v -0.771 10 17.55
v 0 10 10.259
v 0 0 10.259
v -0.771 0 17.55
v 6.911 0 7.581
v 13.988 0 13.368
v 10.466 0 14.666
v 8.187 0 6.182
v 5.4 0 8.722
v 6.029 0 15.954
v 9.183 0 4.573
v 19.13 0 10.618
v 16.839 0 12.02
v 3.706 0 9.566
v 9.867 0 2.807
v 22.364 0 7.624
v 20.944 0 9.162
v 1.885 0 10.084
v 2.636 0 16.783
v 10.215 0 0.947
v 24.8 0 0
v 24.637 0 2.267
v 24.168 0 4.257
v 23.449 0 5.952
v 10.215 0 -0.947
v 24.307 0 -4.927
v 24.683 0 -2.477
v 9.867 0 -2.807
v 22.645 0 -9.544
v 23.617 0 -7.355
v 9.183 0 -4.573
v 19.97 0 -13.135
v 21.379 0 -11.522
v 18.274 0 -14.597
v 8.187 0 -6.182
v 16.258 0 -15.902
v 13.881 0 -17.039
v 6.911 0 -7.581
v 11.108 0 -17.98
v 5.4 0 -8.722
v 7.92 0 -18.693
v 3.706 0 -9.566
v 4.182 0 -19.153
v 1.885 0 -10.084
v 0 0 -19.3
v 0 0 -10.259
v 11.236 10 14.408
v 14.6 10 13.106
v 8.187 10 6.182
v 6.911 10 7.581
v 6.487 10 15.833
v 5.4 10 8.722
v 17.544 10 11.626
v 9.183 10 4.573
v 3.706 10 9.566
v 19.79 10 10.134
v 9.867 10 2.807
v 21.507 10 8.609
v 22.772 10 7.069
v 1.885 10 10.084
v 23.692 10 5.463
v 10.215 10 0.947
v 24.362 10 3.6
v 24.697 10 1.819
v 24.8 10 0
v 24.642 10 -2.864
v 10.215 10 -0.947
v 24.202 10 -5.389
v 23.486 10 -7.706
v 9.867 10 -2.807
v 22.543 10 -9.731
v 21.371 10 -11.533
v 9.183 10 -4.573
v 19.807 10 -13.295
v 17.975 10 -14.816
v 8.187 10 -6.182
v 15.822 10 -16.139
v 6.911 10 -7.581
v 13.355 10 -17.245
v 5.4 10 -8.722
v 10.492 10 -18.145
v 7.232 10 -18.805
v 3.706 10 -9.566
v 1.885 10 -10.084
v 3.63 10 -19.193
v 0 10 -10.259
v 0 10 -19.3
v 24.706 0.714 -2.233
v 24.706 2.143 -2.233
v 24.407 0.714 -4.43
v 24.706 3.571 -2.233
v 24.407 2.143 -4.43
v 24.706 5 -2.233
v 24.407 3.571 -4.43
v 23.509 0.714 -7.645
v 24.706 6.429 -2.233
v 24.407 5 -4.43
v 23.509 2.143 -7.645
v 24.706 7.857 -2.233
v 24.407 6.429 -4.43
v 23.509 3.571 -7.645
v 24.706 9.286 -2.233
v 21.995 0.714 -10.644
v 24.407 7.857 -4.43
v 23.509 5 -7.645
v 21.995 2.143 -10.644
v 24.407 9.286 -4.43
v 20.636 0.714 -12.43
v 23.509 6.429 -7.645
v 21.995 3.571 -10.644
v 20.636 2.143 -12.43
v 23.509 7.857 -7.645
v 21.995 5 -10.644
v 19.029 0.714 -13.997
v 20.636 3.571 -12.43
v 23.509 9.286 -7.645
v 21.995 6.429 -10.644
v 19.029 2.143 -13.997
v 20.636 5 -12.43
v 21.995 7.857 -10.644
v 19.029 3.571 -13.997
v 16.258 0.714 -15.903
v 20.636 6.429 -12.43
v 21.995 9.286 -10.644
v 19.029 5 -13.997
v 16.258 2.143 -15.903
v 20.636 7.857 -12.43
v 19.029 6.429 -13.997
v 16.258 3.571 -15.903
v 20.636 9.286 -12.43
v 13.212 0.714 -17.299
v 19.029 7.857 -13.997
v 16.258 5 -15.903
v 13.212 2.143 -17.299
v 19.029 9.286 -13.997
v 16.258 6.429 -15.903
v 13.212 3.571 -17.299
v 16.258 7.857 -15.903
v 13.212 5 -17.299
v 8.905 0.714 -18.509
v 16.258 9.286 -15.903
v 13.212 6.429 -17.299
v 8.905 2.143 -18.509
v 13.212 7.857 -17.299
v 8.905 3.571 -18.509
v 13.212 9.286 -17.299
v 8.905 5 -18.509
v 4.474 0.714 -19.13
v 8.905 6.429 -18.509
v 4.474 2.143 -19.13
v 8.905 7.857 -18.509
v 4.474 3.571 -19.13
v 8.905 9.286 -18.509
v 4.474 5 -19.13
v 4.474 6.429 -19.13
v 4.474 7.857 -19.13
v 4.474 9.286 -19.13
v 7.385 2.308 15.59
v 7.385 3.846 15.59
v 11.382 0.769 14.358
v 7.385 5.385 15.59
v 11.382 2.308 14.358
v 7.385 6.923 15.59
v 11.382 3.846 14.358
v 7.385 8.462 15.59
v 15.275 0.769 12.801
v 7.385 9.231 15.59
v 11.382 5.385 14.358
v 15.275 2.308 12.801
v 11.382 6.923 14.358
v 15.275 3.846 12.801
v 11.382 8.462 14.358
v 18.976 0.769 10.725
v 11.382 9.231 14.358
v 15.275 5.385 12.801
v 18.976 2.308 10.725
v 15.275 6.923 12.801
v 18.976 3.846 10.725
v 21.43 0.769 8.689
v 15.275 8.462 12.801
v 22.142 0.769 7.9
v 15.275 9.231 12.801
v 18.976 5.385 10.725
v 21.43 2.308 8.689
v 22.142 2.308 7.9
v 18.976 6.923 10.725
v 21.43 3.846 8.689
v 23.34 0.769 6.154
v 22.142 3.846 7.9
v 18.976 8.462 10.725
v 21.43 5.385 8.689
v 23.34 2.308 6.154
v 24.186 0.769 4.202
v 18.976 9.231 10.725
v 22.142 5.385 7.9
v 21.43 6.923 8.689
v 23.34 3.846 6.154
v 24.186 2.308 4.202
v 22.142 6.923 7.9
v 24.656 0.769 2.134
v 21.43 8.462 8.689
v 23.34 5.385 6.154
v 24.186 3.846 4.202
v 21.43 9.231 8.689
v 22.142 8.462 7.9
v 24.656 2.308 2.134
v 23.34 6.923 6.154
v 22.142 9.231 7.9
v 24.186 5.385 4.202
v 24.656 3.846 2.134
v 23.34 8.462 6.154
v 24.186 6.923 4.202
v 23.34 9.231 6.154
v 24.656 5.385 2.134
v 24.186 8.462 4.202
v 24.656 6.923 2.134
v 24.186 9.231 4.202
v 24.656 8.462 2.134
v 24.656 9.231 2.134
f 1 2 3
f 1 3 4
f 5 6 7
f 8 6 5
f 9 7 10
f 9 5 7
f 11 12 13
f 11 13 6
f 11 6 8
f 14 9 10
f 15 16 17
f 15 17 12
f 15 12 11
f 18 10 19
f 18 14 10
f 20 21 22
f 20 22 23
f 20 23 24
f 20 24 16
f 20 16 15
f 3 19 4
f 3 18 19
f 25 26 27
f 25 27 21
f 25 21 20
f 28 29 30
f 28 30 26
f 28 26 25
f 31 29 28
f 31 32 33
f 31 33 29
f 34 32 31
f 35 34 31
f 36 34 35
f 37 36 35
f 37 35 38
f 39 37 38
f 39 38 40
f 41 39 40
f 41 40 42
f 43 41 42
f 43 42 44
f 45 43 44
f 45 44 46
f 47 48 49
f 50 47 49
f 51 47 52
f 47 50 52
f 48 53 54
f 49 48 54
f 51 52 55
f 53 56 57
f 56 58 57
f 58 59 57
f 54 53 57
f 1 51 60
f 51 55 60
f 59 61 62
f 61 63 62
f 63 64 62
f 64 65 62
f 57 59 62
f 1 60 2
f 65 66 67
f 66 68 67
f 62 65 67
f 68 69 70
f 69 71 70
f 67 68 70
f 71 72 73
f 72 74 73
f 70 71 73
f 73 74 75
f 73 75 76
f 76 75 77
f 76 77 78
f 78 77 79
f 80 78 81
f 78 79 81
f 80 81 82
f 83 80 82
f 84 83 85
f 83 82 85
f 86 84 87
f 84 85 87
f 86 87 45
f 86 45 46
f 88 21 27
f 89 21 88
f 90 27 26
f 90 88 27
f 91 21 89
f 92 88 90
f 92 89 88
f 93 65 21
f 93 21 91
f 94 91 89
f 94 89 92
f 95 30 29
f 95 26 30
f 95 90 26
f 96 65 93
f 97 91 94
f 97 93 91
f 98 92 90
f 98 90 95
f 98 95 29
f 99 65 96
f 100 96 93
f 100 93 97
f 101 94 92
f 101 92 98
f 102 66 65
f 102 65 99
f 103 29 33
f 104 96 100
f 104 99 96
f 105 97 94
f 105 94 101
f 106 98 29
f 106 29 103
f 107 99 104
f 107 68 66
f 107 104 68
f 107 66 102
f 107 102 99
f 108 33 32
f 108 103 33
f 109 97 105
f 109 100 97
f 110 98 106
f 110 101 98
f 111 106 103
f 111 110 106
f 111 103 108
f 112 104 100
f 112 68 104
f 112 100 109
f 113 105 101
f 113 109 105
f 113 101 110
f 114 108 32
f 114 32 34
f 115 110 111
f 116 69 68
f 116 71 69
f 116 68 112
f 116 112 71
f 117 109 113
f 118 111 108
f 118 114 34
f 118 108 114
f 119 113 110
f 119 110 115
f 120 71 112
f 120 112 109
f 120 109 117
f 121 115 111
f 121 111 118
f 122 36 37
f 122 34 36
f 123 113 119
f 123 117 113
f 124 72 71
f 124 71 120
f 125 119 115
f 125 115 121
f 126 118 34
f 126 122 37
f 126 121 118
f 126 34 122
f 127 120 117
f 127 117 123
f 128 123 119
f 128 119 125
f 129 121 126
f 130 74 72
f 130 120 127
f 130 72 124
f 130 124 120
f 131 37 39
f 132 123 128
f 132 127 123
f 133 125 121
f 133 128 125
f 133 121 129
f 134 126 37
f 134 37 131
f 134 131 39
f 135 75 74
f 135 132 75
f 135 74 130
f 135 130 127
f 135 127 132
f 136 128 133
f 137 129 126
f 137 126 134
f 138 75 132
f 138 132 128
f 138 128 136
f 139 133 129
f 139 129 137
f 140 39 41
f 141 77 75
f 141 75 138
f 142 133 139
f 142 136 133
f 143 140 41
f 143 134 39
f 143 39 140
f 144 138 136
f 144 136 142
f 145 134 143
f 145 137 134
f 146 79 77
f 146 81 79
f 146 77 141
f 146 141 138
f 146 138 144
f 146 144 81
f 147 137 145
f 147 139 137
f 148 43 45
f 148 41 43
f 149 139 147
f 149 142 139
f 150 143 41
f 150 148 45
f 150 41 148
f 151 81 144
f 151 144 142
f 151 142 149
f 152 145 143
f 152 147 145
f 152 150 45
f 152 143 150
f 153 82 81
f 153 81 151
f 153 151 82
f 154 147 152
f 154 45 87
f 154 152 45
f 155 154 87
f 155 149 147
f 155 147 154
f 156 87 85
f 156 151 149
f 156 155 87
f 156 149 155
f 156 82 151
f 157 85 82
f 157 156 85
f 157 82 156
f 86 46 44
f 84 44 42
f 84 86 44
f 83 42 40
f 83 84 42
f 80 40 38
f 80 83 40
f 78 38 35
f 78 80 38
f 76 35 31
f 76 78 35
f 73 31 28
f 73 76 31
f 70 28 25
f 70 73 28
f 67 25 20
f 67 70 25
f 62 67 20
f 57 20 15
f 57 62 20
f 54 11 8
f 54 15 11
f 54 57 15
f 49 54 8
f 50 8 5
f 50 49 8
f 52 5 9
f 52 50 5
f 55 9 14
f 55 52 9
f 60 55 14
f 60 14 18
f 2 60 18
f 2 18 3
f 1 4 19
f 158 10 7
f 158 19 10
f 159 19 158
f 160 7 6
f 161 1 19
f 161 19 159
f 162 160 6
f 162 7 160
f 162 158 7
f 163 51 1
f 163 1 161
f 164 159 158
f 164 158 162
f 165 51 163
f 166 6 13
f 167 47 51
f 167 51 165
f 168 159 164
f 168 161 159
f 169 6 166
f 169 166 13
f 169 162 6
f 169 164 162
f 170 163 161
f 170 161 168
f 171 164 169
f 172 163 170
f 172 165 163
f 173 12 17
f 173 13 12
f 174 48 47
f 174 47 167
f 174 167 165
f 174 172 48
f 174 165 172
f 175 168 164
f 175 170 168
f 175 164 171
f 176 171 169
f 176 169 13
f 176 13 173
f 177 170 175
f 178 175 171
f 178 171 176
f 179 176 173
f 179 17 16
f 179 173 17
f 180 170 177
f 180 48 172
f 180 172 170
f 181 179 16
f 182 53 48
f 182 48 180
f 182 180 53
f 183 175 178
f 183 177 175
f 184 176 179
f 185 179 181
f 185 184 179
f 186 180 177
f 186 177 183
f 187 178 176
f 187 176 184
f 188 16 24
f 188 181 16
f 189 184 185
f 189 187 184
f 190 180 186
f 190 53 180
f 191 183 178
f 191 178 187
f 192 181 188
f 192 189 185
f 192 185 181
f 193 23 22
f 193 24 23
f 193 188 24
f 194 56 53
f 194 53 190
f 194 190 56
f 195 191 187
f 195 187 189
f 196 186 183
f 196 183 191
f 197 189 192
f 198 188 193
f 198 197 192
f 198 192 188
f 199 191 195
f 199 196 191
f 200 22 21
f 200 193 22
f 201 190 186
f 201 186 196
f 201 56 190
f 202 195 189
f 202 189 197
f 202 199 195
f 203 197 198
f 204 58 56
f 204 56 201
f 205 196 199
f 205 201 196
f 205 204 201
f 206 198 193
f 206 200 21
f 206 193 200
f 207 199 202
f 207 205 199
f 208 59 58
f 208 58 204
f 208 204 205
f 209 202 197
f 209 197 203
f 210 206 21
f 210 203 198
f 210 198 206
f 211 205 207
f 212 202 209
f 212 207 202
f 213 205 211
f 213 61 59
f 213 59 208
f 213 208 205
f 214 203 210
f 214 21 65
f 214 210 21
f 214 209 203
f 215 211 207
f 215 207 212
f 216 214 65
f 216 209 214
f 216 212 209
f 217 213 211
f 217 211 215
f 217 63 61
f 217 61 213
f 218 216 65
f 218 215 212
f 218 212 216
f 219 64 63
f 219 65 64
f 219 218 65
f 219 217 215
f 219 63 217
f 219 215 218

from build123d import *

# Parameters (mm, degrees)
BOSS_EXTRUDE1_DEPTH = 10
SKETCH5_W           = 190.665965361
SKETCH5_H           = 98.914857752
CUT_EXTRUDE2_DEPTH  = 131.512395512
SKETCH3_W           = 191.984120241
SKETCH3_H           = 92.475390347
CUT_EXTRUDE1_DEPTH  = 125.356356188


with BuildPart() as part:
    # Sketch2 → Boss-Extrude1 (new body)
    with BuildSketch(Plane(origin=(0, 0, 0), x_dir=(1, 0, 0), z_dir=(0, 1, 0))):
        with BuildLine():
            Line((-26, 24.3), (0, 24.3))
            add(Edge.make_bspline(
                [(0, 24.3), (20.683832289, 24.384713811), (29.8, 14.098961604), (29.8, 0)],
                knots=[0, 0, 0, 0, 1, 1, 1, 1], degree=3))
            add(Edge.make_bspline(
                [(29.8, 0), (29.8, -15.903385672), (12.793782652, -19.673675204), (0, -22.5)],
                knots=[0, 0, 0, 0, 1, 1, 1, 1], degree=3))
            add(Edge.make_bspline(
                [(-86.5, -27.9), (-58.742591927, -27.9), (0, -22.5)],
                knots=[0, 0, 0, 1, 1, 1], degree=2))
            add(Edge.make_bspline(
                [(-124.6, 11.6), (-126.645501882, -15.929564791), (-96.169164371, -28.458925346), (-86.5, -27.9)],
                knots=[0, 0, 0, 0, 1, 1, 1, 1], degree=3))
            add(Edge.make_bspline(
                [(-86.5, 37.2), (-111.583343569, 37.2), (-124.6, 21.145918181), (-124.6, 11.6)],
                knots=[0, 0, 0, 0, 1, 1, 1, 1], degree=3))
            add(Edge.make_bspline(
                [(-26, 24.3), (-46.37360759, 24.3), (-60.223367409, 37.2), (-86.5, 37.2)],
                knots=[0, 0, 0, 0, 1, 1, 1, 1], degree=3))
        make_face()
    extrude(amount=BOSS_EXTRUDE1_DEPTH)

    # Sketch5 → Cut-Extrude2 (cut, through all)
    with BuildSketch(Plane(origin=(0, 10, 0), x_dir=(1, 0, 0), z_dir=(0, 1, 0))):
        with Locations((-37.807166851, 5.712427693)):
            Rectangle(SKETCH5_W, SKETCH5_H)
        with BuildLine():
            Line((0, 19.3), (-26, 19.3))
            add(Edge.make_bspline(
                [(-26, 19.3), (-28.614389566, 19.3), (-31.195480065, 19.494126305), (-36.299918034, 20.219008193), (-38.823236595, 20.749932309), (-43.82844627, 22.053293526), (-46.31311575, 22.826190042), (-51.244397222, 24.470393512), (-53.69402913, 25.341112046), (-58.607069123, 27.040712597), (-61.070722849, 27.868848632), (-64.806301572, 28.989279687), (-66.059451522, 29.343006622), (-68.572193461, 29.996166113), (-69.832412317, 30.295833479), (-73.626302931, 31.102275727), (-76.173387066, 31.51524352), (-81.307214737, 32.063798503), (-83.893870441, 32.2), (-86.5, 32.2)],
                knots=[0, 0, 0, 0, 0.125, 0.125, 0.25, 0.25, 0.375, 0.375, 0.5, 0.5, 0.625, 0.625, 0.6875, 0.6875, 0.75, 0.75, 0.875, 0.875, 1, 1, 1, 1], degree=3))
            add(Edge.make_bspline(
                [(-86.5, 32.2), (-90.047671723, 32.2), (-93.539315109, 31.853363621), (-97.818101716, 30.88944061), (-98.669522164, 30.669824618), (-100.363040922, 30.17291839), (-101.207876089, 29.89460231), (-103.707194596, 28.9730152), (-105.314538731, 28.24898707), (-108.402461221, 26.564840966), (-109.885156962, 25.604040465), (-112.695415045, 23.412360835), (-113.989352092, 22.209304545), (-115.736354807, 20.217749989), (-116.286105675, 19.522480074), (-117.307591473, 18.056713662), (-117.771937921, 17.297113036), (-118.380597746, 16.112260348), (-118.568848857, 15.709499136), (-118.910400222, 14.885324985), (-119.063856456, 14.46298862), (-119.32099023, 13.612441675), (-119.425833719, 13.182501201), (-119.534502641, 12.528030347), (-119.56255262, 12.308265558), (-119.588853411, 11.975515189), (-119.594973106, 11.86407762), (-119.600932982, 11.639967141), (-119.6, 11.527142129), (-119.6, 11.414500659)],
                knots=[0, 0, 0, 0, 0.25, 0.25, 0.3125, 0.3125, 0.375, 0.375, 0.5, 0.5, 0.625, 0.625, 0.75, 0.75, 0.8125, 0.8125, 0.875, 0.875, 0.90625, 0.90625, 0.9375, 0.9375, 0.96875, 0.96875, 0.984375, 0.984375, 0.9921875, 0.9921875, 1, 1, 1, 1], degree=3))
            add(Edge.make_bspline(
                [(-119.6, 11.414500659), (-119.620469876, 11.139005048), (-119.640012507, 10.863585734), (-119.66949801, 10.313536999), (-119.702590259, 9.489380197), (-119.701746238, 8.668015761), (-119.653311171, 7.029133356), (-119.558725583, 5.941670929), (-119.316814989, 4.318708201), (-119.219497862, 3.779093122), (-118.990298597, 2.702707063), (-118.857842254, 2.164001324), (-118.411370332, 0.568296748), (-118.049576648, -0.466050211), (-117.204822005, -2.479103419), (-116.721870667, -3.457814087), (-115.911016092, -4.886192051), (-115.626316263, -5.355698602), (-115.028686616, -6.281748331), (-114.715117794, -6.739029825), (-113.098128241, -8.967198862), (-111.636582687, -10.586754888), (-109.243370012, -12.821144966), (-108.411754958, -13.533067597), (-107.116844881, -14.554870601), (-106.676456633, -14.888333255), (-105.787025552, -15.535321816), (-105.337421344, -15.84934205), (-103.066112758, -17.374312871), (-101.175798147, -18.452299517), (-98.237583629, -19.870168351), (-97.240844592, -20.309198302), (-95.209999189, -21.114841784), (-94.174615133, -21.48224539), (-92.064314636, -22.126795927), (-91.001033475, -22.402007075), (-89.387886633, -22.70933152), (-88.84713932, -22.794224632), (-88.028751145, -22.879499568), (-87.754740398, -22.90089357), (-87.340882626, -22.916536257), (-87.202453029, -22.918989427), (-86.924204685, -22.915854968), (-86.784006393, -22.908070411), (-86.64375233, -22.899963035)],
                knots=[0, 0, 0, 0, 0.015625, 0.015625, 0.03125, 0.0625, 0.0625, 0.125, 0.125, 0.15625, 0.15625, 0.1875, 0.1875, 0.25, 0.25, 0.3125, 0.3125, 0.34375, 0.34375, 0.375, 0.375, 0.5, 0.5, 0.5625, 0.5625, 0.59375, 0.59375, 0.625, 0.625, 0.75, 0.75, 0.8125, 0.8125, 0.875, 0.875, 0.9375, 0.9375, 0.96875, 0.96875, 0.984375, 0.984375, 0.9921875, 0.9921875, 1, 1, 1, 1], degree=3))
            add(Edge.make_bspline(
                [(-86.64375233, -22.899963035), (-83.051721737, -22.901813131), (-79.463866007, -22.836654879), (-72.292852573, -22.630933055), (-68.709770334, -22.489158228), (-57.965349536, -21.986375675), (-50.808741052, -21.549448214), (-36.50252062, -20.563295893), (-29.353030187, -20.012120654), (-15.058799553, -18.833526914), (-7.914092044, -18.205583695), (-0.771119947, -17.549786375)],
                knots=[0, 0, 0, 0, 0.125, 0.125, 0.25, 0.25, 0.5, 0.5, 0.75, 0.75, 1, 1, 1, 1], degree=3))
            add(Edge.make_bspline(
                [(-0.771119947, -17.549786375), (1.963321139, -16.94544861), (4.695341149, -16.33357579), (8.730024902, -15.218615637), (10.064478195, -14.814466089), (12.699729823, -13.90142355), (14.000796007, -13.393364173), (15.911888282, -12.505206219), (16.542091865, -12.187905528), (17.784402153, -11.496981701), (18.391917697, -11.125662576), (19.559410174, -10.32463286), (20.121164342, -9.894098151), (20.920538613, -9.18924898), (21.180682911, -8.943393186), (21.678462153, -8.434660622), (21.916135354, -8.171907904), (22.59259098, -7.356311131), (22.994745994, -6.776081028), (23.513123046, -5.842290056), (23.671822244, -5.519779327), (23.953566298, -4.86813842), (24.077688222, -4.537273262), (24.402854637, -3.53046254), (24.556745878, -2.840315617), (24.755950633, -1.42732092), (24.8, -0.714331591), (24.8, 0)],
                knots=[0, 0, 0, 0, 0.25, 0.25, 0.375, 0.375, 0.5, 0.5, 0.5625, 0.5625, 0.625, 0.625, 0.6875, 0.6875, 0.71875, 0.71875, 0.75, 0.75, 0.8125, 0.8125, 0.84375, 0.84375, 0.875, 0.875, 0.9375, 0.9375, 1, 1, 1, 1], degree=3))
            add(Edge.make_bspline(
                [(24.8, 0), (24.800001574, 1.499794527), (24.679867583, 2.978315628), (24.270262238, 5.1554747), (24.095205029, 5.874372955), (23.764785291, 6.940708409), (23.64330548, 7.294145508), (23.375491288, 7.996618496), (23.229208001, 8.345127218), (22.758435322, 9.365838107), (22.399931747, 10.019031745), (21.589242675, 11.268187742), (21.136243882, 11.865038785), (19.63468306, 13.559968632), (18.489202915, 14.513686307), (16.909680401, 15.525653475), (16.58535259, 15.719500417), (15.929822317, 16.085938782), (15.598164332, 16.258912353), (14.592578593, 16.74990385), (13.908081512, 17.040104299), (12.515293354, 17.557881638), (11.806985872, 17.785415353), (10.369782811, 18.186296846), (9.638661479, 18.360025682), (7.436633609, 18.806009812), (5.959001697, 19.004489088), (2.98950105, 19.255065786), (1.497532001, 19.3061318), (0, 19.3)],
                knots=[0, 0, 0, 0, 0.125, 0.125, 0.1875, 0.1875, 0.21875, 0.21875, 0.25, 0.25, 0.3125, 0.3125, 0.375, 0.375, 0.5, 0.5, 0.53125, 0.53125, 0.5625, 0.5625, 0.625, 0.625, 0.6875, 0.6875, 0.75, 0.75, 0.875, 0.875, 1, 1, 1, 1], degree=3))
        make_face(mode=Mode.SUBTRACT)
    extrude(amount=-CUT_EXTRUDE2_DEPTH, mode=Mode.SUBTRACT)

    # Sketch3 → Cut-Extrude1 (cut, through all)
    with BuildSketch(Plane(origin=(0, 10, 0), x_dir=(1, 0, 0), z_dir=(0, 1, 0))):
        with Locations((-40.989040218, 1.022012658)):
            Rectangle(SKETCH3_W, SKETCH3_H)
        with BuildLine():
            Line((0, 19.3), (0, 10.258653745))
            ThreePointArc((0, 10.258653745), (10.258653745, 0), (0, -10.258653745))
            Line((0, -10.258653745), (-0.771119947, -17.549786375))
            add(Edge.make_bspline(
                [(-0.771119947, -17.549786375), (1.963321139, -16.94544861), (4.695341149, -16.33357579), (8.730024902, -15.218615637), (10.064478195, -14.814466089), (12.699729823, -13.90142355), (14.000796007, -13.393364173), (15.911888282, -12.505206219), (16.542091865, -12.187905528), (17.784402153, -11.496981701), (18.391917697, -11.125662576), (19.559410174, -10.32463286), (20.121164342, -9.894098151), (20.920538613, -9.18924898), (21.180682911, -8.943393186), (21.678462153, -8.434660622), (21.916135354, -8.171907904), (22.59259098, -7.356311131), (22.994745994, -6.776081028), (23.513123046, -5.842290056), (23.671822244, -5.519779327), (23.953566298, -4.86813842), (24.077688222, -4.537273262), (24.402854637, -3.53046254), (24.556745878, -2.840315617), (24.755950633, -1.42732092), (24.8, -0.714331591), (24.8, 0)],
                knots=[0, 0, 0, 0, 0.25, 0.25, 0.375, 0.375, 0.5, 0.5, 0.5625, 0.5625, 0.625, 0.625, 0.6875, 0.6875, 0.71875, 0.71875, 0.75, 0.75, 0.8125, 0.8125, 0.84375, 0.84375, 0.875, 0.875, 0.9375, 0.9375, 1, 1, 1, 1], degree=3))
            add(Edge.make_bspline(
                [(24.8, 0), (24.800001574, 1.499794527), (24.679867583, 2.978315628), (24.270262238, 5.1554747), (24.095205029, 5.874372955), (23.764785291, 6.940708409), (23.64330548, 7.294145508), (23.375491288, 7.996618496), (23.229208001, 8.345127218), (22.758435322, 9.365838107), (22.399931747, 10.019031745), (21.589242675, 11.268187742), (21.136243882, 11.865038785), (19.63468306, 13.559968632), (18.489202915, 14.513686307), (16.909680401, 15.525653475), (16.58535259, 15.719500417), (15.929822317, 16.085938782), (15.598164332, 16.258912353), (14.592578593, 16.74990385), (13.908081512, 17.040104299), (12.515293354, 17.557881638), (11.806985872, 17.785415353), (10.369782811, 18.186296846), (9.638661479, 18.360025682), (7.436633609, 18.806009812), (5.959001697, 19.004489088), (2.98950105, 19.255065786), (1.497532001, 19.3061318), (0, 19.3)],
                knots=[0, 0, 0, 0, 0.125, 0.125, 0.1875, 0.1875, 0.21875, 0.21875, 0.25, 0.25, 0.3125, 0.3125, 0.375, 0.375, 0.5, 0.5, 0.53125, 0.53125, 0.5625, 0.5625, 0.625, 0.625, 0.6875, 0.6875, 0.75, 0.75, 0.875, 0.875, 1, 1, 1, 1], degree=3))
        make_face(mode=Mode.SUBTRACT)
    extrude(amount=-CUT_EXTRUDE1_DEPTH, mode=Mode.SUBTRACT)


solid = part.part
